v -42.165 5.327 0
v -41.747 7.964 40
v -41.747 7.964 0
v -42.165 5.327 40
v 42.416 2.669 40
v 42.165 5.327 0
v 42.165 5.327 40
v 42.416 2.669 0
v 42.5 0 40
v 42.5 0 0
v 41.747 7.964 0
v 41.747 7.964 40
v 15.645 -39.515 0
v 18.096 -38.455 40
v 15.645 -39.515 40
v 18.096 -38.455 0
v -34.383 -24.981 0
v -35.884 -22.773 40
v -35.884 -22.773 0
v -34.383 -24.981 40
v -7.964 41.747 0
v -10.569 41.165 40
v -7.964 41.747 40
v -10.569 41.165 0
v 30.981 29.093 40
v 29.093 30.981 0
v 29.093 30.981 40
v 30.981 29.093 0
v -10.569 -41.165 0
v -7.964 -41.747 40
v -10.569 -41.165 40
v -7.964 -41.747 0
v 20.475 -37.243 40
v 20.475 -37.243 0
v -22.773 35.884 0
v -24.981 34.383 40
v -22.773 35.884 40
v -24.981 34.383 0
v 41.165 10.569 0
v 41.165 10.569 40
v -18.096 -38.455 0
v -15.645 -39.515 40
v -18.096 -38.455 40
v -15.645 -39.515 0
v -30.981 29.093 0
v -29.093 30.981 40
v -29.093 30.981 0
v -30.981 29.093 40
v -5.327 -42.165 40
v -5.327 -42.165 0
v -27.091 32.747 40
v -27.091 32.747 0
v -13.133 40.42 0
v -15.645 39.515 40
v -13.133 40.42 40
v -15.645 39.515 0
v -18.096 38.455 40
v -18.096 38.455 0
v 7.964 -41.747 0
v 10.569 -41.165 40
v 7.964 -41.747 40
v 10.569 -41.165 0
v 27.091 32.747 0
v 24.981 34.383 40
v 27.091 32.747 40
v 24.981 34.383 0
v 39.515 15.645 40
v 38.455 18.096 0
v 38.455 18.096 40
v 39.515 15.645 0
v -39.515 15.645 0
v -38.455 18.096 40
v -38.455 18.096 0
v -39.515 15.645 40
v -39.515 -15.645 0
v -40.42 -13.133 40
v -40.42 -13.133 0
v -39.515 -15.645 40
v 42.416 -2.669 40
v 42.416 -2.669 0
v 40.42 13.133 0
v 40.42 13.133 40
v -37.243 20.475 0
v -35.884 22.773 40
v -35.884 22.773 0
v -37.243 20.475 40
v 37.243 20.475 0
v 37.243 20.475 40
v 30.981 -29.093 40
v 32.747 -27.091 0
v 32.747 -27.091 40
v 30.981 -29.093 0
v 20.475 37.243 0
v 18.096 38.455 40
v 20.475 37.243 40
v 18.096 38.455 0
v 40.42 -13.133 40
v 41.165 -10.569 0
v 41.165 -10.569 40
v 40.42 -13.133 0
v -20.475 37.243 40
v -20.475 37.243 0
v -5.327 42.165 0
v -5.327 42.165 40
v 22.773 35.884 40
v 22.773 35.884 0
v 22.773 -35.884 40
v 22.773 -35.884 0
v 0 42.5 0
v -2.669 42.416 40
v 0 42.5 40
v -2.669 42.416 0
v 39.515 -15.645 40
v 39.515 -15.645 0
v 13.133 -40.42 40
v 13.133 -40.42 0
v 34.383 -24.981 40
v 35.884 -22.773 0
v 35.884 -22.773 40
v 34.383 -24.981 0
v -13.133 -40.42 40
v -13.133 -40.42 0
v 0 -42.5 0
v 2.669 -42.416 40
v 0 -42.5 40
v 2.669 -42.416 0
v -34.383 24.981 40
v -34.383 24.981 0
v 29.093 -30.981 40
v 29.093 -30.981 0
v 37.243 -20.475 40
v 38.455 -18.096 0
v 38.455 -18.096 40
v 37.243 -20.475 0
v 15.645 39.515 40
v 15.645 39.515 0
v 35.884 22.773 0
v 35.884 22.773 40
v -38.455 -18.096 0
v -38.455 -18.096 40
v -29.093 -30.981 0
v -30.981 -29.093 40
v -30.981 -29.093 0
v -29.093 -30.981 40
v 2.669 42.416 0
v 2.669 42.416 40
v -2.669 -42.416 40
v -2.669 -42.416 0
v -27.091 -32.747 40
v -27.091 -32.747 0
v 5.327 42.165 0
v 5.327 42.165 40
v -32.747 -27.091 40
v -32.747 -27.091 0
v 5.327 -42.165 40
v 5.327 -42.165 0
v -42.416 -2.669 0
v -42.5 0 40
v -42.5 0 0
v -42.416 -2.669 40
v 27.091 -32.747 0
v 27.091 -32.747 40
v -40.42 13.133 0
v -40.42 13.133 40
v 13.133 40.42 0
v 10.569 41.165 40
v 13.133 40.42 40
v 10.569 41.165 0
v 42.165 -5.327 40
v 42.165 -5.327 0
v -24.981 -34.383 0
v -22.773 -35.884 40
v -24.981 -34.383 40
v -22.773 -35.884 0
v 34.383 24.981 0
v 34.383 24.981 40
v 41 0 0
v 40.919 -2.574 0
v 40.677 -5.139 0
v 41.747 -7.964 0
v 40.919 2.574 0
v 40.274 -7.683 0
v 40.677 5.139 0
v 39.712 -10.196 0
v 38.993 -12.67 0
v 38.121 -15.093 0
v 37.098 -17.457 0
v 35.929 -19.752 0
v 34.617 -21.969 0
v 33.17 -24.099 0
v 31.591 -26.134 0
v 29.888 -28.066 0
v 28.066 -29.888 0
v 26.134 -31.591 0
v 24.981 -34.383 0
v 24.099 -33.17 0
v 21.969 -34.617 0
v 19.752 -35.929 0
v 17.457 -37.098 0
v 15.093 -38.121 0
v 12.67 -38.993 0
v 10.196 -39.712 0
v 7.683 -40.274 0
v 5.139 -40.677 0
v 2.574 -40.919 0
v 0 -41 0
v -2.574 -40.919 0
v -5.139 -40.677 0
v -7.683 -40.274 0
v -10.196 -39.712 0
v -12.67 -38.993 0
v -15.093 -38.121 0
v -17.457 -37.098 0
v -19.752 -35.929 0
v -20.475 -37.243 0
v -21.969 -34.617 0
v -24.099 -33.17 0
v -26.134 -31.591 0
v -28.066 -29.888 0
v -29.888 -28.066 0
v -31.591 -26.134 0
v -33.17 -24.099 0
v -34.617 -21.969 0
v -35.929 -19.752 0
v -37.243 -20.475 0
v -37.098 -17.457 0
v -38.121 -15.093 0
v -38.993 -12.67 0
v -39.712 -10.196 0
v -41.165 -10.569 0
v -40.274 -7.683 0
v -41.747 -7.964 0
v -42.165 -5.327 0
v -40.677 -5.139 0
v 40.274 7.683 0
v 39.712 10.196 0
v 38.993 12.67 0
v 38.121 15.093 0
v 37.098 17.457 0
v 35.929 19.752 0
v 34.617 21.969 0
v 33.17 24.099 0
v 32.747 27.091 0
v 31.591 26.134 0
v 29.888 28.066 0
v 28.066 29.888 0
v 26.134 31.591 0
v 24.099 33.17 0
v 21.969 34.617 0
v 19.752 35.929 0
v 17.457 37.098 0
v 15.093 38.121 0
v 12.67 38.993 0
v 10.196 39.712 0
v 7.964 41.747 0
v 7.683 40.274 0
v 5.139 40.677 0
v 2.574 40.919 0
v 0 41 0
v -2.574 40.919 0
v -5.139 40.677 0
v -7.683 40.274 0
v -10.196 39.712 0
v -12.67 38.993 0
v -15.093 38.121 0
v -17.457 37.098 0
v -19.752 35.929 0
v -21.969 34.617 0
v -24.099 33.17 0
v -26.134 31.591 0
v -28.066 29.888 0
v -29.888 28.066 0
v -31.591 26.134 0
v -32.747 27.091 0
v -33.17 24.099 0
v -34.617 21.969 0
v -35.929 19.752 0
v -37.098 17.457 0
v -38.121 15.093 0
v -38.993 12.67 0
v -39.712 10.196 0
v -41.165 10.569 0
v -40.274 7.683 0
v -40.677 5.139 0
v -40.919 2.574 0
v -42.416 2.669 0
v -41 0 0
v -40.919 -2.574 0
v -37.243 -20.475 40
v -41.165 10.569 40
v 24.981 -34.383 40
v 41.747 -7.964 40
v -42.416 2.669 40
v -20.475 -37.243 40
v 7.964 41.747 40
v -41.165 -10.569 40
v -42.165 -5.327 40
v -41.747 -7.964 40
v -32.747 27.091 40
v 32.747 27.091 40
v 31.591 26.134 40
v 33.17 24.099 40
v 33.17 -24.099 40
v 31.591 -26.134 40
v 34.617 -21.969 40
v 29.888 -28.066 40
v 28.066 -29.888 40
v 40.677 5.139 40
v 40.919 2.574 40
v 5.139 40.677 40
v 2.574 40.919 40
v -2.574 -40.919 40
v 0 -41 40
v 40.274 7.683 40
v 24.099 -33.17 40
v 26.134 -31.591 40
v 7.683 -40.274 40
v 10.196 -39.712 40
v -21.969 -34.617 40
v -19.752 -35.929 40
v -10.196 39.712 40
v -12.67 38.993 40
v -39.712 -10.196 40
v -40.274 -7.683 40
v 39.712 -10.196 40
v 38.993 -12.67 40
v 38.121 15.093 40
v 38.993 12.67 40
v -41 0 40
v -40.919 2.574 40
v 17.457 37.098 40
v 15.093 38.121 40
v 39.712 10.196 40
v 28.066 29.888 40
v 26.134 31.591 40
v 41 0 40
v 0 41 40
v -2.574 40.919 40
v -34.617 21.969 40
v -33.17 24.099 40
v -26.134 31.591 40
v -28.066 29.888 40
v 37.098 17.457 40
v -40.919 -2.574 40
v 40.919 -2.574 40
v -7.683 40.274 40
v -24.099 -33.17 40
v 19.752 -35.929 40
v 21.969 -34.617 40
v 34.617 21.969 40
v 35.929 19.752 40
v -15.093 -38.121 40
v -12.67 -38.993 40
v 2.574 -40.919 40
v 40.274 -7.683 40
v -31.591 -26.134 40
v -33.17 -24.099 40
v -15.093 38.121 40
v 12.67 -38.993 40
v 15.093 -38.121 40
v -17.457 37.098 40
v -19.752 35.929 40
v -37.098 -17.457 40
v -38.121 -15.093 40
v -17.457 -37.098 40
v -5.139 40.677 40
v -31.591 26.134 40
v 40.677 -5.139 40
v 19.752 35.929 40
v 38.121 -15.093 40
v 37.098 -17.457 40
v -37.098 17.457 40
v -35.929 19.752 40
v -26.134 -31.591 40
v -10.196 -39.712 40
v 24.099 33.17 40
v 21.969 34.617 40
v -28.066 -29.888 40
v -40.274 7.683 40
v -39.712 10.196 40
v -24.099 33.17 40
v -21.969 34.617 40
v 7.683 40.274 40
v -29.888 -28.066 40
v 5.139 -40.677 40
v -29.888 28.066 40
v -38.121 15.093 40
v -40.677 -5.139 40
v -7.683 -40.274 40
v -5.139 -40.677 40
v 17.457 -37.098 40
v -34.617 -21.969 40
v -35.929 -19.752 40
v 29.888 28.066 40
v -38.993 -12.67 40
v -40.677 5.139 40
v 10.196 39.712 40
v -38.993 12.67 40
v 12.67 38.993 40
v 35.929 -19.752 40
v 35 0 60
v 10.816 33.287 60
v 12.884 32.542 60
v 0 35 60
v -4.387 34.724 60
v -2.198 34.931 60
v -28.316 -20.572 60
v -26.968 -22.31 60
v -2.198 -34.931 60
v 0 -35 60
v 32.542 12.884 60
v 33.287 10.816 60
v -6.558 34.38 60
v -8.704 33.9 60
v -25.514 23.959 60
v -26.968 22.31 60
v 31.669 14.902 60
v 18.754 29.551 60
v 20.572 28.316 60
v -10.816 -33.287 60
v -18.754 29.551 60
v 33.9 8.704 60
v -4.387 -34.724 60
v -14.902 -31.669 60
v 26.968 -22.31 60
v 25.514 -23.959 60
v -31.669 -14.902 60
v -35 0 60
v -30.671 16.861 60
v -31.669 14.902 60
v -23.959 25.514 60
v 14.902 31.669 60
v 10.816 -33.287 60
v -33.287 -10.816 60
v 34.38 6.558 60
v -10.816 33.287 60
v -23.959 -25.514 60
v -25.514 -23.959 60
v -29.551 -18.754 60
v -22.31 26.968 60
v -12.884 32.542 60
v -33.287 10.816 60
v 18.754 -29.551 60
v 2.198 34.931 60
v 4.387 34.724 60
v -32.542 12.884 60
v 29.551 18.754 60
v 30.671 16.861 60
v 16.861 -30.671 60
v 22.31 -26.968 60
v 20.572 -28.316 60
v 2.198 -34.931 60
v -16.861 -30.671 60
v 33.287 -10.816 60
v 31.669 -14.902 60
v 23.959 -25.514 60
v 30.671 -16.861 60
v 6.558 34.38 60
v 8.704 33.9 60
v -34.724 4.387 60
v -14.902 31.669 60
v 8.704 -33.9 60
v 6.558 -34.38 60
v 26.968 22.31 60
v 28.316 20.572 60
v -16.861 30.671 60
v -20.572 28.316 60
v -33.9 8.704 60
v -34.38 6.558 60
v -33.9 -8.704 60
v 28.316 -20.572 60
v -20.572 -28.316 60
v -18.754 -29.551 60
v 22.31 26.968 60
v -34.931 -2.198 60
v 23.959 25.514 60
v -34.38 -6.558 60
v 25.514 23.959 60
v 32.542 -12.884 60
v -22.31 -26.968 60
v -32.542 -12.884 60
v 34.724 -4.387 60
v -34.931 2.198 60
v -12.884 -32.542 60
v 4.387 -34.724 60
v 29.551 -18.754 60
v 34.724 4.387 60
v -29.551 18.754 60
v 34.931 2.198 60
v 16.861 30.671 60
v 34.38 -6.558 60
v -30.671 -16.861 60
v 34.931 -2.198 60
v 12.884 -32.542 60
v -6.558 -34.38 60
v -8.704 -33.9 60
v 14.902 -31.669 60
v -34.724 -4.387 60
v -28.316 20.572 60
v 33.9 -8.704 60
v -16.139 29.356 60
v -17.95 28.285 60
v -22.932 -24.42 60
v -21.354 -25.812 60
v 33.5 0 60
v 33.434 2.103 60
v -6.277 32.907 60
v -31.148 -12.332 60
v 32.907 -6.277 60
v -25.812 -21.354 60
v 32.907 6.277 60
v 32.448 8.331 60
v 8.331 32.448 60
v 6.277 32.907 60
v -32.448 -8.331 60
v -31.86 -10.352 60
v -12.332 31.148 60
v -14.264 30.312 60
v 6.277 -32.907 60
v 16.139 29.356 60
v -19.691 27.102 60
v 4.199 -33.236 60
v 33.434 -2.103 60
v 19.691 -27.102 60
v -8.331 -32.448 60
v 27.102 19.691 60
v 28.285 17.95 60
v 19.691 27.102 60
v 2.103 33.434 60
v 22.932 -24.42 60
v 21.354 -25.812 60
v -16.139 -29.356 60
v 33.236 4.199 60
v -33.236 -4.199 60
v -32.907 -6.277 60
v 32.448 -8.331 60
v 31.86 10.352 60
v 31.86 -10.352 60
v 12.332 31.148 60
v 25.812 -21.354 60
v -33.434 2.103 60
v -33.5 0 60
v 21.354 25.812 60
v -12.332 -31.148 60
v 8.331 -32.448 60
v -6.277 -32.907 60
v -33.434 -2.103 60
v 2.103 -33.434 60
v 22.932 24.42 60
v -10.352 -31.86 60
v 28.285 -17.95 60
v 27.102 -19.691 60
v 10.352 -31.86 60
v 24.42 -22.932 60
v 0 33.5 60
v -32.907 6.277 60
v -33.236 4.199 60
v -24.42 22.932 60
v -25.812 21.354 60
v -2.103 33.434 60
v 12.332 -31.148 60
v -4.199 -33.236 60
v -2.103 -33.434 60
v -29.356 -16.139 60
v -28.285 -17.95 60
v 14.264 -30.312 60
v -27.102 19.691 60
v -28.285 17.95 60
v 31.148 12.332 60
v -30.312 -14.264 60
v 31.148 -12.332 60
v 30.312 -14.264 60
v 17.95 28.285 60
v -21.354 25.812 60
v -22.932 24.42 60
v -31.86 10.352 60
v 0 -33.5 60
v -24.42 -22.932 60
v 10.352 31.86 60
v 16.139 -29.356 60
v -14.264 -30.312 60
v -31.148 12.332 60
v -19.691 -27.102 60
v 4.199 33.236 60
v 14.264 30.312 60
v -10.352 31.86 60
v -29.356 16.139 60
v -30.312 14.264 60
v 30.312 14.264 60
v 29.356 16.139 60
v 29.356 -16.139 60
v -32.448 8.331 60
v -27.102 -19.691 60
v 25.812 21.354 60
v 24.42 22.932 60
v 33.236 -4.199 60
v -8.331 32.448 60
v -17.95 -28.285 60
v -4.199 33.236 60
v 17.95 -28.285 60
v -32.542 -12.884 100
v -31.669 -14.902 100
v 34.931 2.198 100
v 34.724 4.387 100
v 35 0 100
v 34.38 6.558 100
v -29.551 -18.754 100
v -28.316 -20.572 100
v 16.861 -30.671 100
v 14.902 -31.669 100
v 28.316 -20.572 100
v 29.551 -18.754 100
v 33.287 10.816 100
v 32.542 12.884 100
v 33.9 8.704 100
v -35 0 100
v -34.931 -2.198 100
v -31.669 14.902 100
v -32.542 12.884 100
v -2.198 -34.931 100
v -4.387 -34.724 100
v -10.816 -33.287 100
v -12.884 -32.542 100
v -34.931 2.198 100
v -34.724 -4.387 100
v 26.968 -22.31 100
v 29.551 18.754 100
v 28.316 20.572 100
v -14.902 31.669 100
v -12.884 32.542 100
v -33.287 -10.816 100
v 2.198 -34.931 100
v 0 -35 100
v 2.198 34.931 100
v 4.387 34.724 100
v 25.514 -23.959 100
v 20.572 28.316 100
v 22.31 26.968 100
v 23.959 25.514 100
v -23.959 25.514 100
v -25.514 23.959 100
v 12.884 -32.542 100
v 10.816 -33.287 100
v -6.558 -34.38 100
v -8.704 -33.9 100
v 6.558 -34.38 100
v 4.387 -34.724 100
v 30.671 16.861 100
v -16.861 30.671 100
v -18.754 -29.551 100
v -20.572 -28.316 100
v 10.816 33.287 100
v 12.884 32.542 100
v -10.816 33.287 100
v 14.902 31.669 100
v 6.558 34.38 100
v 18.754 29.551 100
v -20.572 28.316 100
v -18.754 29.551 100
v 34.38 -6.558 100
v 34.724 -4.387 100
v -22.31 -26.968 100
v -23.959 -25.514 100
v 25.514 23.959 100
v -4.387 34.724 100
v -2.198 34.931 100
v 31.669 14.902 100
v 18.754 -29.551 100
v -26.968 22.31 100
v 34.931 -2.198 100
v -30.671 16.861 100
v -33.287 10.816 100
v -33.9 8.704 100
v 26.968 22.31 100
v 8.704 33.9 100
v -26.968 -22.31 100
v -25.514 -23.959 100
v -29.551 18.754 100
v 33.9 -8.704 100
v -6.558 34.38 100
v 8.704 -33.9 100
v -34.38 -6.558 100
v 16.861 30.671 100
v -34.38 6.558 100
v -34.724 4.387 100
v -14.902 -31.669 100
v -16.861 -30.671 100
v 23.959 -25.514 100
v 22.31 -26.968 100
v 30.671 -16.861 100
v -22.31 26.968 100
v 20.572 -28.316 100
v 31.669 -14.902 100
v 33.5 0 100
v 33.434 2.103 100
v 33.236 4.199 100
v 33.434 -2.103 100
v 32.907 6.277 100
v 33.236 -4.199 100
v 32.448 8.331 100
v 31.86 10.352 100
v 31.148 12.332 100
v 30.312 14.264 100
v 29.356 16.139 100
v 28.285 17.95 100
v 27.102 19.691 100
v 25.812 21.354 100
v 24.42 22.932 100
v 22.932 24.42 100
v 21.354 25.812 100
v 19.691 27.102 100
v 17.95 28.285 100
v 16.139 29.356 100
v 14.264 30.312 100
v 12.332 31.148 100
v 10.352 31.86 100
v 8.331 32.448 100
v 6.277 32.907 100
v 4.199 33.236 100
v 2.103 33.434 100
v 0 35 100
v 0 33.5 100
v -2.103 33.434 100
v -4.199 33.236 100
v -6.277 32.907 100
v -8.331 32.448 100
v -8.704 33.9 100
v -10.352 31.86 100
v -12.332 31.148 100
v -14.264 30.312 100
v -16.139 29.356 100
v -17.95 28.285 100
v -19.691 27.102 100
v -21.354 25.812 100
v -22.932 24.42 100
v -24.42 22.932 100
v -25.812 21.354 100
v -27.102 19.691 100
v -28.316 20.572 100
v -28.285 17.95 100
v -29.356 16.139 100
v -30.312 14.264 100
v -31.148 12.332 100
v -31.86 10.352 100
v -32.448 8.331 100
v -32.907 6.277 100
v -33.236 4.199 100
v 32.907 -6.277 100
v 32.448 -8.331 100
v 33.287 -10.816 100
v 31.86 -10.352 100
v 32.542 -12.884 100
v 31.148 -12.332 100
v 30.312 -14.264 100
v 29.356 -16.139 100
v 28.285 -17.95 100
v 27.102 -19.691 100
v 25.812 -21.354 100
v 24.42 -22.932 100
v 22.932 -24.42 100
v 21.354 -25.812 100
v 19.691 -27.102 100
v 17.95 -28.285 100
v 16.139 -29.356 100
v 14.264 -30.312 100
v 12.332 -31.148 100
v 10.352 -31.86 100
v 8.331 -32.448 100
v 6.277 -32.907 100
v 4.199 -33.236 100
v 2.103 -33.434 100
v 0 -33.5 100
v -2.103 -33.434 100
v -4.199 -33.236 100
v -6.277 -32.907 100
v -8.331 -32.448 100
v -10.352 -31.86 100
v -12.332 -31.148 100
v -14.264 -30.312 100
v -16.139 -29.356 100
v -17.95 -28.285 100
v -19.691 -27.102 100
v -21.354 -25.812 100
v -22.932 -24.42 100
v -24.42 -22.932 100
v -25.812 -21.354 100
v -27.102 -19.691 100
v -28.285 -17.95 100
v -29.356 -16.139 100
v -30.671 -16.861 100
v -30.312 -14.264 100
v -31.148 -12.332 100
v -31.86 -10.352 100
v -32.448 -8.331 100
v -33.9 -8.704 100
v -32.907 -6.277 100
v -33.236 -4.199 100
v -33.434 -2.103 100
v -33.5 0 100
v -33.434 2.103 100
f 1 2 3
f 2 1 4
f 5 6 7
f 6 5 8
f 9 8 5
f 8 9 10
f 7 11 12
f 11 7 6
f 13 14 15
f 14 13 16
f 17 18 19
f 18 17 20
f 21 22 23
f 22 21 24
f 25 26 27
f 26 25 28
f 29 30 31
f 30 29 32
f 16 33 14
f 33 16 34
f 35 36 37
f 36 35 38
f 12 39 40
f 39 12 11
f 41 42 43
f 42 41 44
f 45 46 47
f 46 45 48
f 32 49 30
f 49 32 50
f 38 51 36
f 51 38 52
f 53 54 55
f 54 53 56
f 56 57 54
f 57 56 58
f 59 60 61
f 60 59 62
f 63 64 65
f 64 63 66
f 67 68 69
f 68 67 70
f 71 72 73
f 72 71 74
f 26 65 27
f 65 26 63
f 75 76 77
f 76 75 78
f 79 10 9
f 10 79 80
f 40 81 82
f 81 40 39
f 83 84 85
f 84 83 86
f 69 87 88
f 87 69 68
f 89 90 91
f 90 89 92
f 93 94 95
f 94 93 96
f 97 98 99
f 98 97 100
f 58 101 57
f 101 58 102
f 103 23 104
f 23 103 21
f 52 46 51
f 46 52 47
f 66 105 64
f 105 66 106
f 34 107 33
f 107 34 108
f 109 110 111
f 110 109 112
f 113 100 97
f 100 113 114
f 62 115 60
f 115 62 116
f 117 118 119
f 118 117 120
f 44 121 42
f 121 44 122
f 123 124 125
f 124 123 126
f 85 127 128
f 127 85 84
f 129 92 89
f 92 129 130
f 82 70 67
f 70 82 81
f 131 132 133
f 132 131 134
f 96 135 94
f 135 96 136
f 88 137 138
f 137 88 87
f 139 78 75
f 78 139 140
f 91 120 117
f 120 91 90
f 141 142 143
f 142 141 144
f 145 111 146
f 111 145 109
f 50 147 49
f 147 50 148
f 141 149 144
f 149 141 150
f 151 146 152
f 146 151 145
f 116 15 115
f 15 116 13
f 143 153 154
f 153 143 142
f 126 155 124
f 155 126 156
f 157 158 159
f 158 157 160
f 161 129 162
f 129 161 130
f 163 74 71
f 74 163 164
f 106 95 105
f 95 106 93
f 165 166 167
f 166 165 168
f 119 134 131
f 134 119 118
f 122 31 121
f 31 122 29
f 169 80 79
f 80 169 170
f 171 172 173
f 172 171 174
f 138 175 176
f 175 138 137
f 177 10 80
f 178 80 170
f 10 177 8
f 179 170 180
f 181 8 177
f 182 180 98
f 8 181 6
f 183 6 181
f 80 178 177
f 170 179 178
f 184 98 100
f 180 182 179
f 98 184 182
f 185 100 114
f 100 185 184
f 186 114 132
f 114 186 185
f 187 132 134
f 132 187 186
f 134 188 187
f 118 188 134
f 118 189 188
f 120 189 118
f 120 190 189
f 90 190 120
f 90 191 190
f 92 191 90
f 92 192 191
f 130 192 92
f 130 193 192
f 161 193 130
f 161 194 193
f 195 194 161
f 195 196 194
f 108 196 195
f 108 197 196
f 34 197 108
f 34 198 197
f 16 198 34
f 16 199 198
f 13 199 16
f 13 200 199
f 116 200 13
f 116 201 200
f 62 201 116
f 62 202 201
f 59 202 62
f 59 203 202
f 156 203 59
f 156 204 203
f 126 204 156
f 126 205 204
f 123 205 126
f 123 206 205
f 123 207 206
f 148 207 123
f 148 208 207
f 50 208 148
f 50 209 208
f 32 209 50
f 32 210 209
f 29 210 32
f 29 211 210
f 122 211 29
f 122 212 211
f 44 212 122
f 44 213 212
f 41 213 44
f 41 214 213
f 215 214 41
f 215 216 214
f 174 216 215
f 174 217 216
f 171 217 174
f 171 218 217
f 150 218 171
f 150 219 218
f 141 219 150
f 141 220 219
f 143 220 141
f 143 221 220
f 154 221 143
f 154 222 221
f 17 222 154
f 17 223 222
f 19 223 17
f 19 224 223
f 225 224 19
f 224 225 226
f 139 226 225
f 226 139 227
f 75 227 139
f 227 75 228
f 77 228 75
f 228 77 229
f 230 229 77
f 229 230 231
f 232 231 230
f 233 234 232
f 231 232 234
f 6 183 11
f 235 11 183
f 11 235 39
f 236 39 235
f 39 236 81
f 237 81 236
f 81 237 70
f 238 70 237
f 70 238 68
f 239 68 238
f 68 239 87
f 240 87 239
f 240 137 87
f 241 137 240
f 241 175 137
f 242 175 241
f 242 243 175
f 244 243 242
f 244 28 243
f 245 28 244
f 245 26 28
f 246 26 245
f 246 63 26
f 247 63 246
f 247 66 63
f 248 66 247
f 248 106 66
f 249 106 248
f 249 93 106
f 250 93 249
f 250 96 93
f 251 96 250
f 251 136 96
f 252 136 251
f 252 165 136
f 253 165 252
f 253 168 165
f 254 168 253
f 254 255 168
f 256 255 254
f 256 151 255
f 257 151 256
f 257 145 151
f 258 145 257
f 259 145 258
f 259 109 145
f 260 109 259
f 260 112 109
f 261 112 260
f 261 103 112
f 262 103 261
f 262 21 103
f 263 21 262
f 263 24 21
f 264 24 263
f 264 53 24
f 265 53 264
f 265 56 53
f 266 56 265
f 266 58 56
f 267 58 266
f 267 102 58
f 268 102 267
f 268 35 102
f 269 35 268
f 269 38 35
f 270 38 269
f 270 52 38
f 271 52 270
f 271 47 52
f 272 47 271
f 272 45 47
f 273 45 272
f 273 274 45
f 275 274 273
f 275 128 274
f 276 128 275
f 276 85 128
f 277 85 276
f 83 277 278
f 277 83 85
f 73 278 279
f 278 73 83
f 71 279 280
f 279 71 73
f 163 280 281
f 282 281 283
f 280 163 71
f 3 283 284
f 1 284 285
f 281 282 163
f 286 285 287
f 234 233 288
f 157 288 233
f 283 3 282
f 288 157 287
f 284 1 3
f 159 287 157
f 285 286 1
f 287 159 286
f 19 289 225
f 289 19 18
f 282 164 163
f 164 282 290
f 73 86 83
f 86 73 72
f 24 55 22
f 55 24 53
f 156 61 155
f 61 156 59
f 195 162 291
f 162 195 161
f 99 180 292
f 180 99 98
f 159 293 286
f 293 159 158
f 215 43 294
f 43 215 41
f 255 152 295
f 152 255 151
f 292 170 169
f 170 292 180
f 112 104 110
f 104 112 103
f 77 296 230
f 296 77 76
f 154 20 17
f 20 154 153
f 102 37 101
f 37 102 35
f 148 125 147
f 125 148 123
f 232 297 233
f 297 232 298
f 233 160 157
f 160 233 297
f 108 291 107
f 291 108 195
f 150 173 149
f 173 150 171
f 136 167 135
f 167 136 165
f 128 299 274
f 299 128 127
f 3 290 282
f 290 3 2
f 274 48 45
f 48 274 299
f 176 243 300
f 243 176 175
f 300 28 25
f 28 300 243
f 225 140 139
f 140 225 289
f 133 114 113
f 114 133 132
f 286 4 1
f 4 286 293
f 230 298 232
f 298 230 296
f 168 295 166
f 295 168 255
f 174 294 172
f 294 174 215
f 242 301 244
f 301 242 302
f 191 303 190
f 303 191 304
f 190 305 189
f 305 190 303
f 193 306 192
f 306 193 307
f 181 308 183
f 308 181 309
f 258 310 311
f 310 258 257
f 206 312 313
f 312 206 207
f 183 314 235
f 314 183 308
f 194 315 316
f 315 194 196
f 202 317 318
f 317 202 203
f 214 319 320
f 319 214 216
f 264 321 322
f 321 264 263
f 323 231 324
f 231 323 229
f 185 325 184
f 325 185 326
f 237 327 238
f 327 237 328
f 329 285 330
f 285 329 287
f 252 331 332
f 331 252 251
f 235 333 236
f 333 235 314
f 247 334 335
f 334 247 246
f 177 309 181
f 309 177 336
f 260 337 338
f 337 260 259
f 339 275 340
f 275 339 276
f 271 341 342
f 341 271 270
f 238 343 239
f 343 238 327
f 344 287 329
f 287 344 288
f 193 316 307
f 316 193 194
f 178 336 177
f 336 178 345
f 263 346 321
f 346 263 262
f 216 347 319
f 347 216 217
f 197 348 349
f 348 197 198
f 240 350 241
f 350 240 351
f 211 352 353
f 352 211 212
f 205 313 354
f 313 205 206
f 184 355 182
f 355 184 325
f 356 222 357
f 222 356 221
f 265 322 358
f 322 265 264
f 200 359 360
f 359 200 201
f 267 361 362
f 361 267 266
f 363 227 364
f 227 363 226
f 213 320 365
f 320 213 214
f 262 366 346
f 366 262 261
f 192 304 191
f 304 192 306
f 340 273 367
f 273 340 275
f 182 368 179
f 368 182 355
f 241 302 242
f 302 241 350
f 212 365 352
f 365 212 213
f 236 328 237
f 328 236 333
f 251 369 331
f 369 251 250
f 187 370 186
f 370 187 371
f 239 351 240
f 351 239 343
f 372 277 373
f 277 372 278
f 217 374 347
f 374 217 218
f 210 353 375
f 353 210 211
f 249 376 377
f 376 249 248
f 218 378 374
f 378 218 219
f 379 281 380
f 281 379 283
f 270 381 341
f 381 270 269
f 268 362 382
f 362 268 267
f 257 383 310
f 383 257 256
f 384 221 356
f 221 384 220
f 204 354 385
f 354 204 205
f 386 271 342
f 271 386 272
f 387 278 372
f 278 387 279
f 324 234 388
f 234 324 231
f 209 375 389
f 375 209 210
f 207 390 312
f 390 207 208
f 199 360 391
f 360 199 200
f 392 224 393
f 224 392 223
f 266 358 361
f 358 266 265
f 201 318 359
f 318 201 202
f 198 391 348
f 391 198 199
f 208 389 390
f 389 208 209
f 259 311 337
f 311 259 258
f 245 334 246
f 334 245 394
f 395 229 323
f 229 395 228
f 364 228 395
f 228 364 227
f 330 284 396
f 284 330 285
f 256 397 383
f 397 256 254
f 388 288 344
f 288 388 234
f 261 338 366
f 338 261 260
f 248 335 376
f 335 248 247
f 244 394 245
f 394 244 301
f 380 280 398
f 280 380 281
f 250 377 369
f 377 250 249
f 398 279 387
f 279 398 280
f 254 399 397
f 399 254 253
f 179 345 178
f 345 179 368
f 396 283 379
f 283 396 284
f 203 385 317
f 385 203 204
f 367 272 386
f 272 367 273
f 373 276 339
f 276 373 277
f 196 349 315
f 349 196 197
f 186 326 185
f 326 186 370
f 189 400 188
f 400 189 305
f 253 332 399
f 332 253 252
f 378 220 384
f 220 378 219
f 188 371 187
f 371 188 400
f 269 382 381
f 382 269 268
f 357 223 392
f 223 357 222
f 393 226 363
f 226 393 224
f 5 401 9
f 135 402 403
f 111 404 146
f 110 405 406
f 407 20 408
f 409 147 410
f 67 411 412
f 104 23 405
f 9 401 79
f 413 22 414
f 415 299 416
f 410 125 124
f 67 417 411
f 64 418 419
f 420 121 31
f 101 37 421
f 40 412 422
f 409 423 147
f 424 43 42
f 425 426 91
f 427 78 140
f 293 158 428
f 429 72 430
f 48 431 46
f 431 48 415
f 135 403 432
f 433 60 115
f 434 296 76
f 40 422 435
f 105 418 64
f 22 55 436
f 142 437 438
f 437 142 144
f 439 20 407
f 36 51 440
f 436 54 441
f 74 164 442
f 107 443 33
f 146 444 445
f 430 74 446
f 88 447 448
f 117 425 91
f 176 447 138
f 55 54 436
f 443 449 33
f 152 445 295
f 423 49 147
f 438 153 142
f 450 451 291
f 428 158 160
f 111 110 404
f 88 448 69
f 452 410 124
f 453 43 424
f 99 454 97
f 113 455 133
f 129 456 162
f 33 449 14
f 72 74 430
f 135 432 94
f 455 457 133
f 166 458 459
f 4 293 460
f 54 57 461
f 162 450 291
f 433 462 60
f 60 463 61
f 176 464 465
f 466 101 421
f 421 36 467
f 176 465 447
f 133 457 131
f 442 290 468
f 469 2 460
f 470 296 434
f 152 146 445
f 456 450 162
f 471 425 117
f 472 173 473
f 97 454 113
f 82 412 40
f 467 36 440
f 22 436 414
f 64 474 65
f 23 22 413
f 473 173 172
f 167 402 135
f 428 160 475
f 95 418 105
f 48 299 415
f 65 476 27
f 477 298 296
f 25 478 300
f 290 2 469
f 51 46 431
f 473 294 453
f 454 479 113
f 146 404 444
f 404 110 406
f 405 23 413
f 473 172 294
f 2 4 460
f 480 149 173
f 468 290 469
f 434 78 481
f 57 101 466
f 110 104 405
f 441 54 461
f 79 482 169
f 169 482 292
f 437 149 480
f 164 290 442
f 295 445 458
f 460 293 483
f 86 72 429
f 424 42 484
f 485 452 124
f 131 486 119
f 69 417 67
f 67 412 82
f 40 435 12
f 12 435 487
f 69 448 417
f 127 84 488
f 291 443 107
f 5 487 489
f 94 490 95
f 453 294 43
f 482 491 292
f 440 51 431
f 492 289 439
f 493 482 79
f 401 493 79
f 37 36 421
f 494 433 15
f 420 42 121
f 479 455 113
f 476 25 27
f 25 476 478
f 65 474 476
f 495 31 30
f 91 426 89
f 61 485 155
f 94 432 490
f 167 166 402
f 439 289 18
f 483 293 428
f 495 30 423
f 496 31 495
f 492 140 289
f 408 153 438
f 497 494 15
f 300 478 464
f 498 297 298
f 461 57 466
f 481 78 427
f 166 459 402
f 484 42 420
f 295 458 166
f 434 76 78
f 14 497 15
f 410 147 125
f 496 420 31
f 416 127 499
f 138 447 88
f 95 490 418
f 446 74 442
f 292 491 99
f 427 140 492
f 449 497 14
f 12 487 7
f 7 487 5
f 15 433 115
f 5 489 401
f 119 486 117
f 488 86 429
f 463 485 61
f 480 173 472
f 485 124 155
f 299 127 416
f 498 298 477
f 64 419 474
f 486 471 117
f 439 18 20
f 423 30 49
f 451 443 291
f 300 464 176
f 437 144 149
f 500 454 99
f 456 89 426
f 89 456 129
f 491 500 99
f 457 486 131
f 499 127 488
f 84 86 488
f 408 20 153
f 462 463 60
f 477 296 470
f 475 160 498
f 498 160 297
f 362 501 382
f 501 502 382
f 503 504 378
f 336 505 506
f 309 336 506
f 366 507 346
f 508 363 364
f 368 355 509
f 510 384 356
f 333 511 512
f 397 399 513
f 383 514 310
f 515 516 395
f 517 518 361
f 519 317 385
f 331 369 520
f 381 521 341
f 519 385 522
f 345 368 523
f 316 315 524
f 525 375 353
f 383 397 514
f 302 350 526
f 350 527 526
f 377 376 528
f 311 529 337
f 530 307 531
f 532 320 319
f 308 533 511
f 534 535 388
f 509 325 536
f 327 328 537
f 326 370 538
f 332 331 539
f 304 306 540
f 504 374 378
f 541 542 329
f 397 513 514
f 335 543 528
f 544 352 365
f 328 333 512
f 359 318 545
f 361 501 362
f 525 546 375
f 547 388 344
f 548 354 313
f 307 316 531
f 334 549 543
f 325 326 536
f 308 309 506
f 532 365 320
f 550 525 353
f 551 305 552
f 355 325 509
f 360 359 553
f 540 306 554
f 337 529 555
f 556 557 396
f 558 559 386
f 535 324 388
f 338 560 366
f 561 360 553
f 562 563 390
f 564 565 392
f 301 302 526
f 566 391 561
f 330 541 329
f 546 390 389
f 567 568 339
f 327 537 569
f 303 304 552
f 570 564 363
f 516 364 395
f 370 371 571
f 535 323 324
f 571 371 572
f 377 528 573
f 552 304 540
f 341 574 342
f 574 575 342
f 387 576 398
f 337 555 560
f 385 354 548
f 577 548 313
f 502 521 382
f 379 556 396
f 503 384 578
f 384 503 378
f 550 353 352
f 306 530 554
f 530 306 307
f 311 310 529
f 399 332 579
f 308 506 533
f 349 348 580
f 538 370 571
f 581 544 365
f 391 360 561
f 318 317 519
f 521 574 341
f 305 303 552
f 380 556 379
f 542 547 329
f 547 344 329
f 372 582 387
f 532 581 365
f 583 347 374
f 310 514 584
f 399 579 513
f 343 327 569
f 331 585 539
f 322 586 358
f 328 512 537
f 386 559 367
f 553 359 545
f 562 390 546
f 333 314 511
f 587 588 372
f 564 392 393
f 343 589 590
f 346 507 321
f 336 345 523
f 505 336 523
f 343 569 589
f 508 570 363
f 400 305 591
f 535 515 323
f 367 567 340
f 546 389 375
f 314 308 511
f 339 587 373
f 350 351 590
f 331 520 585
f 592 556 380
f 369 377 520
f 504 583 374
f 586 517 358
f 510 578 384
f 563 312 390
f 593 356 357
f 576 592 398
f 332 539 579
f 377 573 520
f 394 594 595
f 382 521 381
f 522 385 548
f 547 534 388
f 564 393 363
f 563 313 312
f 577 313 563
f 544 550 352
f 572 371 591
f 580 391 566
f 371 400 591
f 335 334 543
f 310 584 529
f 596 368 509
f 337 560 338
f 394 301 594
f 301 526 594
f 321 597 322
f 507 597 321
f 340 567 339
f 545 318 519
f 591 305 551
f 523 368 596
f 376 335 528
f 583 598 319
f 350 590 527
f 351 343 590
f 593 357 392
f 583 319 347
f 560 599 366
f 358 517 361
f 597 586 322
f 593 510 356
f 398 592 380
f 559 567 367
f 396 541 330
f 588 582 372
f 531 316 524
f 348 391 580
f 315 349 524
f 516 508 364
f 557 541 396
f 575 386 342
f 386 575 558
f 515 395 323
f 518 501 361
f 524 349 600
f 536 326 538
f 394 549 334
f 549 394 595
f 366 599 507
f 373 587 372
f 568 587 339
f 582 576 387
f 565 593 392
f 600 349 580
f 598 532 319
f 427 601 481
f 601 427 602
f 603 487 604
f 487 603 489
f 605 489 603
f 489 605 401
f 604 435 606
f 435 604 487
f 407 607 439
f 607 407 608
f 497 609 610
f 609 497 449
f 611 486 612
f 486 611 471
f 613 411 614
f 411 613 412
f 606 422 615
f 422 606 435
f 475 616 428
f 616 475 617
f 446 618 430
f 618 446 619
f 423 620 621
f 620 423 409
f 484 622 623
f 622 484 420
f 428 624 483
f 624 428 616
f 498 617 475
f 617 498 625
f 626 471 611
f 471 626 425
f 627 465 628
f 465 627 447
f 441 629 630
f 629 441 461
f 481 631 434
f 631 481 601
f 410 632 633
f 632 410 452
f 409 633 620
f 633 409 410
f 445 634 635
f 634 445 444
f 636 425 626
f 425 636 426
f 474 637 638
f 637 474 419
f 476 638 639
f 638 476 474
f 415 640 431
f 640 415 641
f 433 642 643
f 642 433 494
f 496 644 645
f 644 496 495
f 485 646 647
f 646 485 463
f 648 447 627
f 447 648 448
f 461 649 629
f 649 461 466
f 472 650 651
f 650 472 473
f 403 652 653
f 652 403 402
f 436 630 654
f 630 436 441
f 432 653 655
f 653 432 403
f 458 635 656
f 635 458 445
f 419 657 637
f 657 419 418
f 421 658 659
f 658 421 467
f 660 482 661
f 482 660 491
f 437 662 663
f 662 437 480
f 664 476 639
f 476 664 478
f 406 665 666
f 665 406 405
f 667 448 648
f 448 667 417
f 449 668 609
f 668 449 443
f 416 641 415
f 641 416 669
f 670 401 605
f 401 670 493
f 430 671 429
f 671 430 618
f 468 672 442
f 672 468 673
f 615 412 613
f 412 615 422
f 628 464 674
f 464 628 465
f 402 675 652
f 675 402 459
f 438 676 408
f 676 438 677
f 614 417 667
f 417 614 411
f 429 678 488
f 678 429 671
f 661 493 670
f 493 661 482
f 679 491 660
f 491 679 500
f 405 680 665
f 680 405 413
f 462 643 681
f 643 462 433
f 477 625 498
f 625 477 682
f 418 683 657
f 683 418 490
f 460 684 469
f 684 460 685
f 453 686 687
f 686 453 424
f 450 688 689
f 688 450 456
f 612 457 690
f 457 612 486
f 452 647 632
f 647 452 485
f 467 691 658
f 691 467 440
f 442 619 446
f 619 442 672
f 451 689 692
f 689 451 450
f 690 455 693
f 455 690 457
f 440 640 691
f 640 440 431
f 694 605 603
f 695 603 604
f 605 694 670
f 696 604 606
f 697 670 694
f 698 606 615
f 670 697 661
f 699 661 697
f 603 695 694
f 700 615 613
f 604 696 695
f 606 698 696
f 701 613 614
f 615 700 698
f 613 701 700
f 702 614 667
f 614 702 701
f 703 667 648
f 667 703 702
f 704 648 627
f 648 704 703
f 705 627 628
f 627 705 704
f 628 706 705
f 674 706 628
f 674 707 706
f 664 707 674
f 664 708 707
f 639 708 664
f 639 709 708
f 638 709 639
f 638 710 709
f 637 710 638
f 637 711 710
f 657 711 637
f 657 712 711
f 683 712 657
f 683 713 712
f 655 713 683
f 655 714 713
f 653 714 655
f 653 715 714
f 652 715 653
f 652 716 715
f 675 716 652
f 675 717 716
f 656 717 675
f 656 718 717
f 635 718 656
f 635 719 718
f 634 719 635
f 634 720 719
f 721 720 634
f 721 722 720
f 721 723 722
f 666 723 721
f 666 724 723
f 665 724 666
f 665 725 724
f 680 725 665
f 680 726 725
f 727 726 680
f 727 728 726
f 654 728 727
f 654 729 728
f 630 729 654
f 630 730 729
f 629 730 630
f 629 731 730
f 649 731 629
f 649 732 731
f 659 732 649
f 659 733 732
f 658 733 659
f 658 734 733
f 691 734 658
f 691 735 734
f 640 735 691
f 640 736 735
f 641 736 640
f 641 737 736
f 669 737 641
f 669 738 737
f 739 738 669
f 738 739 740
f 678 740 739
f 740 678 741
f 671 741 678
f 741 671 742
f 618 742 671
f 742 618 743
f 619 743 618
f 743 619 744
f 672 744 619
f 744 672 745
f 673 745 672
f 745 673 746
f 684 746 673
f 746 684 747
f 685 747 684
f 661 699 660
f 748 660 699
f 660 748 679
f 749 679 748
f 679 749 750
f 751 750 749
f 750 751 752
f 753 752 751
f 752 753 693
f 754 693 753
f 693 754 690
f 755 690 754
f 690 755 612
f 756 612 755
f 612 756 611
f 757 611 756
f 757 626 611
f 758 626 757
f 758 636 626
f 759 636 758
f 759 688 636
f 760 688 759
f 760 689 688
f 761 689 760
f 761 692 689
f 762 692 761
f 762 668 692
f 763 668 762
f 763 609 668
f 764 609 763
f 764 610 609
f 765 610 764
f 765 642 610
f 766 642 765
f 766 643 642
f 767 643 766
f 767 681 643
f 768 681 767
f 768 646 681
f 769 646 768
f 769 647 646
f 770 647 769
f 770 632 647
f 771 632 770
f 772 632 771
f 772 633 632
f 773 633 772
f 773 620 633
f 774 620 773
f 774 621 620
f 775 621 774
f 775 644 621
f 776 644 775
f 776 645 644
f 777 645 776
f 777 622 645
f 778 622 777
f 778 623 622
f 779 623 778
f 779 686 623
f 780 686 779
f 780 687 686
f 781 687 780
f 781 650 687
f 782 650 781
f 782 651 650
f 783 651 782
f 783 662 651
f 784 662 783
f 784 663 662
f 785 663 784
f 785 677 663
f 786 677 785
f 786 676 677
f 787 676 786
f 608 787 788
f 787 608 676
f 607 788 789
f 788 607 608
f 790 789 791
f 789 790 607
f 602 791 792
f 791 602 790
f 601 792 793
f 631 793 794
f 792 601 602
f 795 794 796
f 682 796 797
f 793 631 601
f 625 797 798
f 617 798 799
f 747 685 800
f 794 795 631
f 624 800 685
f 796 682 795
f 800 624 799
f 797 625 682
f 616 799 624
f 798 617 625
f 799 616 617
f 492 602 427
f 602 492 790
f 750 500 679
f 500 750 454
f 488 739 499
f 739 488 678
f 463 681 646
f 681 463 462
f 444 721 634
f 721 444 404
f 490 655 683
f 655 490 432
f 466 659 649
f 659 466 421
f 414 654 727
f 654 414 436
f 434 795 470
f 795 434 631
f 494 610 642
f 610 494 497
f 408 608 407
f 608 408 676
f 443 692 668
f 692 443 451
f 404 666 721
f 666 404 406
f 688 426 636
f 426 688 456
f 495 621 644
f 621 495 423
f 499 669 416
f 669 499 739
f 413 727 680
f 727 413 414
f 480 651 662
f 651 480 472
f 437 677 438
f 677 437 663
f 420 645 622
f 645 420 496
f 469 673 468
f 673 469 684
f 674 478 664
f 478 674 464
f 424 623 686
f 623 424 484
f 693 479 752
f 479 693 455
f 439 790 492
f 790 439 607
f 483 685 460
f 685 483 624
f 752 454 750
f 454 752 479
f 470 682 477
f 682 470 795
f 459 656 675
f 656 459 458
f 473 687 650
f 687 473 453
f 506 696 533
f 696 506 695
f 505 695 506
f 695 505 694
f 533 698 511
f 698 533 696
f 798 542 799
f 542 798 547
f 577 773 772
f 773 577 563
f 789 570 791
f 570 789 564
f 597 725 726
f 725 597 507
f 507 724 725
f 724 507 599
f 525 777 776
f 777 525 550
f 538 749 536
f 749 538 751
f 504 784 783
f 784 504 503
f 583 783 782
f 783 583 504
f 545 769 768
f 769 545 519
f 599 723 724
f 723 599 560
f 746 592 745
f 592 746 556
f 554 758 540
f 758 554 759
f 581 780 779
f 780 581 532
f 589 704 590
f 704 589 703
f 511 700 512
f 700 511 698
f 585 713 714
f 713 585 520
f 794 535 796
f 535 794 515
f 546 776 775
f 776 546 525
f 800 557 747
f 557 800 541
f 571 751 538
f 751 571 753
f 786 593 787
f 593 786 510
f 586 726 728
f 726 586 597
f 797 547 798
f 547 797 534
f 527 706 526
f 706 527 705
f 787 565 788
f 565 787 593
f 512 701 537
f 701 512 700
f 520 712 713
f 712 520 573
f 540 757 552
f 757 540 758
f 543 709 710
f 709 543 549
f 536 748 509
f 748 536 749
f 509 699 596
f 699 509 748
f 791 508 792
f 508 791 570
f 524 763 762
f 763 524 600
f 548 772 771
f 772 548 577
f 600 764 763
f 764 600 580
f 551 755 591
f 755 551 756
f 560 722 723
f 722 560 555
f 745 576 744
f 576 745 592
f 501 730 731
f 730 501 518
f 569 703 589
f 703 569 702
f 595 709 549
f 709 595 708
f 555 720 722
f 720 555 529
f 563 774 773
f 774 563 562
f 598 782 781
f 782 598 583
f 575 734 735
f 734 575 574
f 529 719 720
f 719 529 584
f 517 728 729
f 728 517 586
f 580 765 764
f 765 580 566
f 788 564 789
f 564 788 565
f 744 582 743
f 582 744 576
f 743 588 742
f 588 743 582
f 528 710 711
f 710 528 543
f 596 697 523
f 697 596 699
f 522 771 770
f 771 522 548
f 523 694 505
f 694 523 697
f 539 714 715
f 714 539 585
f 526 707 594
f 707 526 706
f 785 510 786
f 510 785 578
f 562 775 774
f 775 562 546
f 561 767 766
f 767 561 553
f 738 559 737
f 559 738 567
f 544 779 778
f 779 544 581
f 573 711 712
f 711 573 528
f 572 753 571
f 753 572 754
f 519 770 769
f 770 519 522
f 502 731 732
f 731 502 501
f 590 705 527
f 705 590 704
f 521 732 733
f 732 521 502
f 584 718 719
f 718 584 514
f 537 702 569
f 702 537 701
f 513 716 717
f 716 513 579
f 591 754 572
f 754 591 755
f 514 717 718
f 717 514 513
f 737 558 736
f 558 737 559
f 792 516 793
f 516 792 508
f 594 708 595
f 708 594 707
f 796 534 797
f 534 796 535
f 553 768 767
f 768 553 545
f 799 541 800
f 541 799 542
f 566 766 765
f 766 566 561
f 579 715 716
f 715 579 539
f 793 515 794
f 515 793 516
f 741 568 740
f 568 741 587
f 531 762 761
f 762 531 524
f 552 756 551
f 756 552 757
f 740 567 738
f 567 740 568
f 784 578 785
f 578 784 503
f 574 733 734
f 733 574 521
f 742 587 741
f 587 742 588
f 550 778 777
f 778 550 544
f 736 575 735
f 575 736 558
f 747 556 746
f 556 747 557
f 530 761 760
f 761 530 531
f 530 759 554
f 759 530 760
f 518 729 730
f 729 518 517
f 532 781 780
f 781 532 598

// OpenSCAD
$fn=100;
big_diameter=85;
small_diameter=70;
thickness=3;
big_height=40;
small_height=40;
inter_height=20;

// Grande section 
difference() {
    cylinder(h=big_height, d=big_diameter, center=false);
    cylinder(h=big_height, d=big_diameter-thickness, center=false);
}

// Section réductive
translate([0, 0, big_height]) {
    difference() {
        cylinder(h=inter_height, d1=big_diameter, d2=small_diameter, center=false);
        cylinder(h=inter_height, d1=big_diameter-thickness, d2=small_diameter-thickness, center=false);
    }
}

// petite section
translate([0, 0, big_height+inter_height]) {
    difference() {
        cylinder(h=small_height, d=small_diameter, center=false);
        cylinder(h=small_height, d=small_diameter-thickness, center=false);
    }
}
